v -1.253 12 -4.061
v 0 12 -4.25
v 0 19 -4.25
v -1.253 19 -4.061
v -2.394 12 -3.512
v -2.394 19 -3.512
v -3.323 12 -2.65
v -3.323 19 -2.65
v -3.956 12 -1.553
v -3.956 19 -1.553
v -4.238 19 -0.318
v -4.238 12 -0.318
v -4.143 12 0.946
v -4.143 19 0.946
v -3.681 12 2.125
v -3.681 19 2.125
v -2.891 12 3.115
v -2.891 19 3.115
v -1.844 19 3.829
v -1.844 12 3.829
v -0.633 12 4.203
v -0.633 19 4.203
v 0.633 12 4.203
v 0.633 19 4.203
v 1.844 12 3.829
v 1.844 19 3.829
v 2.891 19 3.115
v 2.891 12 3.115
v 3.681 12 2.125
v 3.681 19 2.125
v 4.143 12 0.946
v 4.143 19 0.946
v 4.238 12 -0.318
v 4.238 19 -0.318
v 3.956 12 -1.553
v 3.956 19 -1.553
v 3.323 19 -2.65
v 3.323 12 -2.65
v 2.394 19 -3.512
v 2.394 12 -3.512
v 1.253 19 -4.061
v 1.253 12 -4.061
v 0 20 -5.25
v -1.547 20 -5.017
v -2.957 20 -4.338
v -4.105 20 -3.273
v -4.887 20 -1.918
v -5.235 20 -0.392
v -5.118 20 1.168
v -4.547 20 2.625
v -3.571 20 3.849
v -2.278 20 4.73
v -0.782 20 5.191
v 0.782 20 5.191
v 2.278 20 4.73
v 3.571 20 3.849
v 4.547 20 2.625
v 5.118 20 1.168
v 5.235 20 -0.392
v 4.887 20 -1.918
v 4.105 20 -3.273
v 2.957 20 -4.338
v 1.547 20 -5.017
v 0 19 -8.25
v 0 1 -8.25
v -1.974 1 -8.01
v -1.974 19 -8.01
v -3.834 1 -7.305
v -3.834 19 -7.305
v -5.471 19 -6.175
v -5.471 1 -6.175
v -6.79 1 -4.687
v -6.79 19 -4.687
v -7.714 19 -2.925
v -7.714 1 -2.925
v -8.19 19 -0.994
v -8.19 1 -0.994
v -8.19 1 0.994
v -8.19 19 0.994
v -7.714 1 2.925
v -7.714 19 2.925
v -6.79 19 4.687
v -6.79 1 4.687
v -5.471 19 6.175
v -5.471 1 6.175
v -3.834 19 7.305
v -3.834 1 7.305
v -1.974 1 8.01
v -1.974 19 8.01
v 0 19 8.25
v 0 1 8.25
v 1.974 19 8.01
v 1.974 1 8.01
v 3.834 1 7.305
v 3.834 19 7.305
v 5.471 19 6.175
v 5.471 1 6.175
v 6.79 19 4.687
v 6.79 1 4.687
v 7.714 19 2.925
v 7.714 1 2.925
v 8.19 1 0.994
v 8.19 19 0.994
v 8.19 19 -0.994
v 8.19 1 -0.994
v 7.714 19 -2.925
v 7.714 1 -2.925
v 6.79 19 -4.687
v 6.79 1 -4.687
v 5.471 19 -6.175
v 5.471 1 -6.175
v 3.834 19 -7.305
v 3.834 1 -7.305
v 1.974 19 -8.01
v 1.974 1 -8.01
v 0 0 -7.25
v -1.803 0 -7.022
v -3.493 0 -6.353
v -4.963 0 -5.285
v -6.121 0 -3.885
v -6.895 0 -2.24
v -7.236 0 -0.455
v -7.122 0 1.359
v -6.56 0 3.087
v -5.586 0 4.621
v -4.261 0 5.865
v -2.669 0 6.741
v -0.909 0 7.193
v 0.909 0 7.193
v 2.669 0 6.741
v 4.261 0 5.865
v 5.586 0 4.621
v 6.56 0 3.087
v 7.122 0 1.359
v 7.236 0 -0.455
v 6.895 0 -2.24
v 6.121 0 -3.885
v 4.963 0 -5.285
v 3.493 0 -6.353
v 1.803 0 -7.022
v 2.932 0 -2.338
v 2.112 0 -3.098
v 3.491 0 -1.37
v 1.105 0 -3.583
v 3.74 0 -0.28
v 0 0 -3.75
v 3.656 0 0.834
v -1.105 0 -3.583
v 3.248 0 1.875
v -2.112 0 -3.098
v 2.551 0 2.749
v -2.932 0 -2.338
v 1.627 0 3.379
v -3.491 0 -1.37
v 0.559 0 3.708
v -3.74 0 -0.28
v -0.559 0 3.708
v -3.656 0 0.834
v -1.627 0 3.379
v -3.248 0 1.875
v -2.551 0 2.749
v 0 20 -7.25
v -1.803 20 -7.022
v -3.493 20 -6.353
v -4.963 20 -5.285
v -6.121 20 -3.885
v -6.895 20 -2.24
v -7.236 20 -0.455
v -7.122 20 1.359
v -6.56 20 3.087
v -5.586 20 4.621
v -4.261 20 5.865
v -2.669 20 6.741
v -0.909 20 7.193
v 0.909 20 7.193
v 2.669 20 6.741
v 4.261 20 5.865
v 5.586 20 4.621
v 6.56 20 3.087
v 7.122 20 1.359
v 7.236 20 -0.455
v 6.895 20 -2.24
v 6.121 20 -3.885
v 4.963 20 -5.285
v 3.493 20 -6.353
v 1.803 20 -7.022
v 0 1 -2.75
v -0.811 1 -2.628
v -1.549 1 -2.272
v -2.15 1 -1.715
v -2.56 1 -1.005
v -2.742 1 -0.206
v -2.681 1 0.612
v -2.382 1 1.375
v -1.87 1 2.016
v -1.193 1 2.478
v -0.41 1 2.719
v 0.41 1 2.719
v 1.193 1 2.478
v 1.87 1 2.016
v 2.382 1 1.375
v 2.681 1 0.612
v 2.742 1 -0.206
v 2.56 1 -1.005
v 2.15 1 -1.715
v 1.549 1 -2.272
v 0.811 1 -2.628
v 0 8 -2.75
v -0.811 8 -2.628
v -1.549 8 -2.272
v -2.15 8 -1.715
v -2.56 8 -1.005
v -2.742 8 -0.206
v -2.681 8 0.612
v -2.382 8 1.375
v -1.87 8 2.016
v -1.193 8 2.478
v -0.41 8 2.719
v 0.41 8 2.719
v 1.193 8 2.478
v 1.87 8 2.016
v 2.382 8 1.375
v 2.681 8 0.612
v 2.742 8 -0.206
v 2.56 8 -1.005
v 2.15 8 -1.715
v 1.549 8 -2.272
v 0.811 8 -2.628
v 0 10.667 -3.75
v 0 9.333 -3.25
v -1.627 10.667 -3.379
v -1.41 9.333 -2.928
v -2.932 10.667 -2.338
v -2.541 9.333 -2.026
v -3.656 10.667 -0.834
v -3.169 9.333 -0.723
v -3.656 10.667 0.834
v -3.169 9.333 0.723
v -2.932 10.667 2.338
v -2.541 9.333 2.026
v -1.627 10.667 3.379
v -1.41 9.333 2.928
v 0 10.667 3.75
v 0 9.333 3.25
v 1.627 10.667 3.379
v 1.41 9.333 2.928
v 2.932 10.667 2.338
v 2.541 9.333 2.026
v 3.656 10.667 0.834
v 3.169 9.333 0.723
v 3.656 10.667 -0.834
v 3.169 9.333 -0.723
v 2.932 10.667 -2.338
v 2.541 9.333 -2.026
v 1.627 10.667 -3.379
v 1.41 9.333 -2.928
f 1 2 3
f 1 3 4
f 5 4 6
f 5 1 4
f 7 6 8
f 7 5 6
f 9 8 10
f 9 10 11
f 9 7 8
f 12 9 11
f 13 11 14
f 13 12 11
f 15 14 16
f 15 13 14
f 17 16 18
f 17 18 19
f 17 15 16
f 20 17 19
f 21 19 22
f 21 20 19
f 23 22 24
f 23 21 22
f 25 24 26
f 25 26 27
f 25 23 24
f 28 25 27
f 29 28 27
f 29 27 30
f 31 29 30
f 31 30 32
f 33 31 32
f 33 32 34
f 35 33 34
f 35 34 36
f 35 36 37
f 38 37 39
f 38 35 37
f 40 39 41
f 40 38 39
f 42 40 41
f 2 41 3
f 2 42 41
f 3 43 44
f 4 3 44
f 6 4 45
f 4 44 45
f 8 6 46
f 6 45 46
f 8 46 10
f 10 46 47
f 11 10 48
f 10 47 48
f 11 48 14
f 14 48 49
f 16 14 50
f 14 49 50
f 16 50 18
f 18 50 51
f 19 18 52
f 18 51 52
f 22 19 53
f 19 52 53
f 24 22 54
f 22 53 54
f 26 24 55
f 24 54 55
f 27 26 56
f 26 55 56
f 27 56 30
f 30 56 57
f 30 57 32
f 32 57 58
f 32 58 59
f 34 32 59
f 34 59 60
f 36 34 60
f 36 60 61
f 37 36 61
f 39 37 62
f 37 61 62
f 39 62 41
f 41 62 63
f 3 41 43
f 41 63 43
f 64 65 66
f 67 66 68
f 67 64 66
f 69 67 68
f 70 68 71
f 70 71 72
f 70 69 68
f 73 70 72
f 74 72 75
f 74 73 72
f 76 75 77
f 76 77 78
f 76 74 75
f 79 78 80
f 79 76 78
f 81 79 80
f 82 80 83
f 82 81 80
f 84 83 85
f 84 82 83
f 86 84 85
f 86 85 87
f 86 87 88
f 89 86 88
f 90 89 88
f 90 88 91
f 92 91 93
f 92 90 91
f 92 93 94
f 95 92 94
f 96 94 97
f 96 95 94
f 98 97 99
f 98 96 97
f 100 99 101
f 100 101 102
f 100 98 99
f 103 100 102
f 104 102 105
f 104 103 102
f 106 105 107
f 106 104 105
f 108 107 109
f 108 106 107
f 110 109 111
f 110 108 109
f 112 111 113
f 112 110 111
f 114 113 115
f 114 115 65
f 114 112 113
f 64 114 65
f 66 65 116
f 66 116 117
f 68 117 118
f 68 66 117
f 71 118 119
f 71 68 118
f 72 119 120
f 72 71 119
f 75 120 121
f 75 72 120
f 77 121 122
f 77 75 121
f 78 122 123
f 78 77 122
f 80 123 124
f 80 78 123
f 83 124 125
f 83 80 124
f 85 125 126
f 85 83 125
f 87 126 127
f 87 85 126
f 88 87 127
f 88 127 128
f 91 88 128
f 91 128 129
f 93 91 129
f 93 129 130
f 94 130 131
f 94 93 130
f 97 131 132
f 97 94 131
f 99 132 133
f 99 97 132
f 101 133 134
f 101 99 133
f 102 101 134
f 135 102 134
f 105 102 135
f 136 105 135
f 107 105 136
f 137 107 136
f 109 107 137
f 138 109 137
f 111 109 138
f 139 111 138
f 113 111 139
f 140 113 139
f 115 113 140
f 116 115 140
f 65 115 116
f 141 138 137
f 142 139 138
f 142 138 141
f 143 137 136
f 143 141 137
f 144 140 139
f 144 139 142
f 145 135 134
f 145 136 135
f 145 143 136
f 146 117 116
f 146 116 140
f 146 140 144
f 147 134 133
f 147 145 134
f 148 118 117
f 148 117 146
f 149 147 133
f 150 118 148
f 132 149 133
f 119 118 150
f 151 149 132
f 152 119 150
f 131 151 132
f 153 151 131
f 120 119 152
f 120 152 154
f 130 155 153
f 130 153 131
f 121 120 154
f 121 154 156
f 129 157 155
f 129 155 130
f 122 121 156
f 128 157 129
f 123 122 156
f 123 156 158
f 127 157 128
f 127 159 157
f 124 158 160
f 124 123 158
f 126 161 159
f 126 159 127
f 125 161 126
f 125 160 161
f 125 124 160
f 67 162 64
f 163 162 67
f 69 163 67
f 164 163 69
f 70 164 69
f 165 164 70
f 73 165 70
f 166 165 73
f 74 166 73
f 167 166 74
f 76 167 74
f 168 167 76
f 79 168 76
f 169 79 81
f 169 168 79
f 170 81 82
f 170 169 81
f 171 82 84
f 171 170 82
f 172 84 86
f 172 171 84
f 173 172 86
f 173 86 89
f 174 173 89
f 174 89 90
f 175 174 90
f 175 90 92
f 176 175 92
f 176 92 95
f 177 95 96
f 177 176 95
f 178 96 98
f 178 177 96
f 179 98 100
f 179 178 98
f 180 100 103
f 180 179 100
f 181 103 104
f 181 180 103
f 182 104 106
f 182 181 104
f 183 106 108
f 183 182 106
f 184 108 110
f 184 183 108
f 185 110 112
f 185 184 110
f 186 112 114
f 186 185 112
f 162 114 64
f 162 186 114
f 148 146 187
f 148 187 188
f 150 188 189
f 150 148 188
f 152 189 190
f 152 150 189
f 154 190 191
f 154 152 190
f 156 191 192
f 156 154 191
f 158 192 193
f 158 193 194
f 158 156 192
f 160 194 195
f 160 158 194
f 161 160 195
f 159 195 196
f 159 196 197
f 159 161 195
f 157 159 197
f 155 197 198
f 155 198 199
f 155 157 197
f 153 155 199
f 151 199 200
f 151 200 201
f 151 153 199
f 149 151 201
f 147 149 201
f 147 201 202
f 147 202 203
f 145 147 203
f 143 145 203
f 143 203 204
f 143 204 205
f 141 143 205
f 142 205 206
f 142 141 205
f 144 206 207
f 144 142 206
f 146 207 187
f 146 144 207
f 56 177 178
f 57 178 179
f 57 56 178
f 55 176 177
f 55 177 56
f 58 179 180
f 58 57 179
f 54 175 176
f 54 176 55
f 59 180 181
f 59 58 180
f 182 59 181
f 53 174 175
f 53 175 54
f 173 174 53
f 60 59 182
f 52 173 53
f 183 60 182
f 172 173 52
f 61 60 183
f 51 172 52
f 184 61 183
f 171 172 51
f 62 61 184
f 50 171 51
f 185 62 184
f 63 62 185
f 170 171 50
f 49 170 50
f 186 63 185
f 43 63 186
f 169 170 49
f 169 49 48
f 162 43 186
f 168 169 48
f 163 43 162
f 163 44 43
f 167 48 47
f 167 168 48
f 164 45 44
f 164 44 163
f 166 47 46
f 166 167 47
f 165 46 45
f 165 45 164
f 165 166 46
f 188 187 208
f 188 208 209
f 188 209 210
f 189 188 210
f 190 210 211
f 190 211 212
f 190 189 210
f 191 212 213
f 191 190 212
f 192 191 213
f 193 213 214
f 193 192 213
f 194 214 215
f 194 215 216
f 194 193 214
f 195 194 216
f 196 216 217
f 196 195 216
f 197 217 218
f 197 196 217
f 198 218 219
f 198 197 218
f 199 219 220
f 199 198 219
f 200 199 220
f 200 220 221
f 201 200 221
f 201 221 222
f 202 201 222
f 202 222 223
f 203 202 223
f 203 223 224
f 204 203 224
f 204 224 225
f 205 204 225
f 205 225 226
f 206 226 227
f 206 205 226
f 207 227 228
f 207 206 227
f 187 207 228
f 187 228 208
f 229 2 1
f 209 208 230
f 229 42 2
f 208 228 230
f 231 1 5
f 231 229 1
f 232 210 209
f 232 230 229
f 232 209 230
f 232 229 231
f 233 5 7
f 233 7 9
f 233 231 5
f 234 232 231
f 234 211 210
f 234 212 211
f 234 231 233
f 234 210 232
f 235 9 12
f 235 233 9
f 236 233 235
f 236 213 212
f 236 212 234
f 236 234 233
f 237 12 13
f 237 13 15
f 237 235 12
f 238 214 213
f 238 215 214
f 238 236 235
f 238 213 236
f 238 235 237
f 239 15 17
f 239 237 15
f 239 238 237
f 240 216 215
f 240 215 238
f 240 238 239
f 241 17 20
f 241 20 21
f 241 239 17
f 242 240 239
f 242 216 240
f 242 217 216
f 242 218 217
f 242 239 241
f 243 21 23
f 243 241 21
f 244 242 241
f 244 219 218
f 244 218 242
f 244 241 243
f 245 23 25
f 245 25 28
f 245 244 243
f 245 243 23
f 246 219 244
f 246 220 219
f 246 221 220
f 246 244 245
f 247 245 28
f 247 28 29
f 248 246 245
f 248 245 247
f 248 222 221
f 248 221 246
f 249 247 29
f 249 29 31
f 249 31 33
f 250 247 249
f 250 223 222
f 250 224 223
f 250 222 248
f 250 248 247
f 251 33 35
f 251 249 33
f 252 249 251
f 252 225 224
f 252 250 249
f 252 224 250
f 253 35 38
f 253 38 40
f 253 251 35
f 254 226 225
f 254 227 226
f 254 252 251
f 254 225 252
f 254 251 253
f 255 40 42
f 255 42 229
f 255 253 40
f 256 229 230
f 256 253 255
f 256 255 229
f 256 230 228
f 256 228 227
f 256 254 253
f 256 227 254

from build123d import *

# Parameters (mm, degrees)
CHAMFER1_SIZE = 1


with BuildPart() as part:
    # Sketch1 → Revolve1 (revolve)
    with BuildSketch(Plane(origin=(0, 0, 0), x_dir=(0, 0, -1), z_dir=(1, 0, 0)), mode=Mode.PRIVATE) as revolve1_sk:
        Polygon((-4.25, 20), (-4.25, 12), (-2.75, 8), (-2.75, 0), (-8.25, 0), (-8.25, 20), align=None)
    revolve(revolve1_sk.sketch.rotate(Axis((0, 0, 0), (0, 1, 0)), 180), axis=Axis((0, 0, 0), (0, 1, 0)))

    # Chamfer1
    chamfer1_edges = [part.edges().sort_by_distance(p)[0] for p in [
        (0, 20, 8.25),
        (0, 0, 8.25),
        (0, 0, 2.75),
        (0, 20, 4.25),
    ]]
    chamfer(chamfer1_edges, length=CHAMFER1_SIZE)


solid = part.part
